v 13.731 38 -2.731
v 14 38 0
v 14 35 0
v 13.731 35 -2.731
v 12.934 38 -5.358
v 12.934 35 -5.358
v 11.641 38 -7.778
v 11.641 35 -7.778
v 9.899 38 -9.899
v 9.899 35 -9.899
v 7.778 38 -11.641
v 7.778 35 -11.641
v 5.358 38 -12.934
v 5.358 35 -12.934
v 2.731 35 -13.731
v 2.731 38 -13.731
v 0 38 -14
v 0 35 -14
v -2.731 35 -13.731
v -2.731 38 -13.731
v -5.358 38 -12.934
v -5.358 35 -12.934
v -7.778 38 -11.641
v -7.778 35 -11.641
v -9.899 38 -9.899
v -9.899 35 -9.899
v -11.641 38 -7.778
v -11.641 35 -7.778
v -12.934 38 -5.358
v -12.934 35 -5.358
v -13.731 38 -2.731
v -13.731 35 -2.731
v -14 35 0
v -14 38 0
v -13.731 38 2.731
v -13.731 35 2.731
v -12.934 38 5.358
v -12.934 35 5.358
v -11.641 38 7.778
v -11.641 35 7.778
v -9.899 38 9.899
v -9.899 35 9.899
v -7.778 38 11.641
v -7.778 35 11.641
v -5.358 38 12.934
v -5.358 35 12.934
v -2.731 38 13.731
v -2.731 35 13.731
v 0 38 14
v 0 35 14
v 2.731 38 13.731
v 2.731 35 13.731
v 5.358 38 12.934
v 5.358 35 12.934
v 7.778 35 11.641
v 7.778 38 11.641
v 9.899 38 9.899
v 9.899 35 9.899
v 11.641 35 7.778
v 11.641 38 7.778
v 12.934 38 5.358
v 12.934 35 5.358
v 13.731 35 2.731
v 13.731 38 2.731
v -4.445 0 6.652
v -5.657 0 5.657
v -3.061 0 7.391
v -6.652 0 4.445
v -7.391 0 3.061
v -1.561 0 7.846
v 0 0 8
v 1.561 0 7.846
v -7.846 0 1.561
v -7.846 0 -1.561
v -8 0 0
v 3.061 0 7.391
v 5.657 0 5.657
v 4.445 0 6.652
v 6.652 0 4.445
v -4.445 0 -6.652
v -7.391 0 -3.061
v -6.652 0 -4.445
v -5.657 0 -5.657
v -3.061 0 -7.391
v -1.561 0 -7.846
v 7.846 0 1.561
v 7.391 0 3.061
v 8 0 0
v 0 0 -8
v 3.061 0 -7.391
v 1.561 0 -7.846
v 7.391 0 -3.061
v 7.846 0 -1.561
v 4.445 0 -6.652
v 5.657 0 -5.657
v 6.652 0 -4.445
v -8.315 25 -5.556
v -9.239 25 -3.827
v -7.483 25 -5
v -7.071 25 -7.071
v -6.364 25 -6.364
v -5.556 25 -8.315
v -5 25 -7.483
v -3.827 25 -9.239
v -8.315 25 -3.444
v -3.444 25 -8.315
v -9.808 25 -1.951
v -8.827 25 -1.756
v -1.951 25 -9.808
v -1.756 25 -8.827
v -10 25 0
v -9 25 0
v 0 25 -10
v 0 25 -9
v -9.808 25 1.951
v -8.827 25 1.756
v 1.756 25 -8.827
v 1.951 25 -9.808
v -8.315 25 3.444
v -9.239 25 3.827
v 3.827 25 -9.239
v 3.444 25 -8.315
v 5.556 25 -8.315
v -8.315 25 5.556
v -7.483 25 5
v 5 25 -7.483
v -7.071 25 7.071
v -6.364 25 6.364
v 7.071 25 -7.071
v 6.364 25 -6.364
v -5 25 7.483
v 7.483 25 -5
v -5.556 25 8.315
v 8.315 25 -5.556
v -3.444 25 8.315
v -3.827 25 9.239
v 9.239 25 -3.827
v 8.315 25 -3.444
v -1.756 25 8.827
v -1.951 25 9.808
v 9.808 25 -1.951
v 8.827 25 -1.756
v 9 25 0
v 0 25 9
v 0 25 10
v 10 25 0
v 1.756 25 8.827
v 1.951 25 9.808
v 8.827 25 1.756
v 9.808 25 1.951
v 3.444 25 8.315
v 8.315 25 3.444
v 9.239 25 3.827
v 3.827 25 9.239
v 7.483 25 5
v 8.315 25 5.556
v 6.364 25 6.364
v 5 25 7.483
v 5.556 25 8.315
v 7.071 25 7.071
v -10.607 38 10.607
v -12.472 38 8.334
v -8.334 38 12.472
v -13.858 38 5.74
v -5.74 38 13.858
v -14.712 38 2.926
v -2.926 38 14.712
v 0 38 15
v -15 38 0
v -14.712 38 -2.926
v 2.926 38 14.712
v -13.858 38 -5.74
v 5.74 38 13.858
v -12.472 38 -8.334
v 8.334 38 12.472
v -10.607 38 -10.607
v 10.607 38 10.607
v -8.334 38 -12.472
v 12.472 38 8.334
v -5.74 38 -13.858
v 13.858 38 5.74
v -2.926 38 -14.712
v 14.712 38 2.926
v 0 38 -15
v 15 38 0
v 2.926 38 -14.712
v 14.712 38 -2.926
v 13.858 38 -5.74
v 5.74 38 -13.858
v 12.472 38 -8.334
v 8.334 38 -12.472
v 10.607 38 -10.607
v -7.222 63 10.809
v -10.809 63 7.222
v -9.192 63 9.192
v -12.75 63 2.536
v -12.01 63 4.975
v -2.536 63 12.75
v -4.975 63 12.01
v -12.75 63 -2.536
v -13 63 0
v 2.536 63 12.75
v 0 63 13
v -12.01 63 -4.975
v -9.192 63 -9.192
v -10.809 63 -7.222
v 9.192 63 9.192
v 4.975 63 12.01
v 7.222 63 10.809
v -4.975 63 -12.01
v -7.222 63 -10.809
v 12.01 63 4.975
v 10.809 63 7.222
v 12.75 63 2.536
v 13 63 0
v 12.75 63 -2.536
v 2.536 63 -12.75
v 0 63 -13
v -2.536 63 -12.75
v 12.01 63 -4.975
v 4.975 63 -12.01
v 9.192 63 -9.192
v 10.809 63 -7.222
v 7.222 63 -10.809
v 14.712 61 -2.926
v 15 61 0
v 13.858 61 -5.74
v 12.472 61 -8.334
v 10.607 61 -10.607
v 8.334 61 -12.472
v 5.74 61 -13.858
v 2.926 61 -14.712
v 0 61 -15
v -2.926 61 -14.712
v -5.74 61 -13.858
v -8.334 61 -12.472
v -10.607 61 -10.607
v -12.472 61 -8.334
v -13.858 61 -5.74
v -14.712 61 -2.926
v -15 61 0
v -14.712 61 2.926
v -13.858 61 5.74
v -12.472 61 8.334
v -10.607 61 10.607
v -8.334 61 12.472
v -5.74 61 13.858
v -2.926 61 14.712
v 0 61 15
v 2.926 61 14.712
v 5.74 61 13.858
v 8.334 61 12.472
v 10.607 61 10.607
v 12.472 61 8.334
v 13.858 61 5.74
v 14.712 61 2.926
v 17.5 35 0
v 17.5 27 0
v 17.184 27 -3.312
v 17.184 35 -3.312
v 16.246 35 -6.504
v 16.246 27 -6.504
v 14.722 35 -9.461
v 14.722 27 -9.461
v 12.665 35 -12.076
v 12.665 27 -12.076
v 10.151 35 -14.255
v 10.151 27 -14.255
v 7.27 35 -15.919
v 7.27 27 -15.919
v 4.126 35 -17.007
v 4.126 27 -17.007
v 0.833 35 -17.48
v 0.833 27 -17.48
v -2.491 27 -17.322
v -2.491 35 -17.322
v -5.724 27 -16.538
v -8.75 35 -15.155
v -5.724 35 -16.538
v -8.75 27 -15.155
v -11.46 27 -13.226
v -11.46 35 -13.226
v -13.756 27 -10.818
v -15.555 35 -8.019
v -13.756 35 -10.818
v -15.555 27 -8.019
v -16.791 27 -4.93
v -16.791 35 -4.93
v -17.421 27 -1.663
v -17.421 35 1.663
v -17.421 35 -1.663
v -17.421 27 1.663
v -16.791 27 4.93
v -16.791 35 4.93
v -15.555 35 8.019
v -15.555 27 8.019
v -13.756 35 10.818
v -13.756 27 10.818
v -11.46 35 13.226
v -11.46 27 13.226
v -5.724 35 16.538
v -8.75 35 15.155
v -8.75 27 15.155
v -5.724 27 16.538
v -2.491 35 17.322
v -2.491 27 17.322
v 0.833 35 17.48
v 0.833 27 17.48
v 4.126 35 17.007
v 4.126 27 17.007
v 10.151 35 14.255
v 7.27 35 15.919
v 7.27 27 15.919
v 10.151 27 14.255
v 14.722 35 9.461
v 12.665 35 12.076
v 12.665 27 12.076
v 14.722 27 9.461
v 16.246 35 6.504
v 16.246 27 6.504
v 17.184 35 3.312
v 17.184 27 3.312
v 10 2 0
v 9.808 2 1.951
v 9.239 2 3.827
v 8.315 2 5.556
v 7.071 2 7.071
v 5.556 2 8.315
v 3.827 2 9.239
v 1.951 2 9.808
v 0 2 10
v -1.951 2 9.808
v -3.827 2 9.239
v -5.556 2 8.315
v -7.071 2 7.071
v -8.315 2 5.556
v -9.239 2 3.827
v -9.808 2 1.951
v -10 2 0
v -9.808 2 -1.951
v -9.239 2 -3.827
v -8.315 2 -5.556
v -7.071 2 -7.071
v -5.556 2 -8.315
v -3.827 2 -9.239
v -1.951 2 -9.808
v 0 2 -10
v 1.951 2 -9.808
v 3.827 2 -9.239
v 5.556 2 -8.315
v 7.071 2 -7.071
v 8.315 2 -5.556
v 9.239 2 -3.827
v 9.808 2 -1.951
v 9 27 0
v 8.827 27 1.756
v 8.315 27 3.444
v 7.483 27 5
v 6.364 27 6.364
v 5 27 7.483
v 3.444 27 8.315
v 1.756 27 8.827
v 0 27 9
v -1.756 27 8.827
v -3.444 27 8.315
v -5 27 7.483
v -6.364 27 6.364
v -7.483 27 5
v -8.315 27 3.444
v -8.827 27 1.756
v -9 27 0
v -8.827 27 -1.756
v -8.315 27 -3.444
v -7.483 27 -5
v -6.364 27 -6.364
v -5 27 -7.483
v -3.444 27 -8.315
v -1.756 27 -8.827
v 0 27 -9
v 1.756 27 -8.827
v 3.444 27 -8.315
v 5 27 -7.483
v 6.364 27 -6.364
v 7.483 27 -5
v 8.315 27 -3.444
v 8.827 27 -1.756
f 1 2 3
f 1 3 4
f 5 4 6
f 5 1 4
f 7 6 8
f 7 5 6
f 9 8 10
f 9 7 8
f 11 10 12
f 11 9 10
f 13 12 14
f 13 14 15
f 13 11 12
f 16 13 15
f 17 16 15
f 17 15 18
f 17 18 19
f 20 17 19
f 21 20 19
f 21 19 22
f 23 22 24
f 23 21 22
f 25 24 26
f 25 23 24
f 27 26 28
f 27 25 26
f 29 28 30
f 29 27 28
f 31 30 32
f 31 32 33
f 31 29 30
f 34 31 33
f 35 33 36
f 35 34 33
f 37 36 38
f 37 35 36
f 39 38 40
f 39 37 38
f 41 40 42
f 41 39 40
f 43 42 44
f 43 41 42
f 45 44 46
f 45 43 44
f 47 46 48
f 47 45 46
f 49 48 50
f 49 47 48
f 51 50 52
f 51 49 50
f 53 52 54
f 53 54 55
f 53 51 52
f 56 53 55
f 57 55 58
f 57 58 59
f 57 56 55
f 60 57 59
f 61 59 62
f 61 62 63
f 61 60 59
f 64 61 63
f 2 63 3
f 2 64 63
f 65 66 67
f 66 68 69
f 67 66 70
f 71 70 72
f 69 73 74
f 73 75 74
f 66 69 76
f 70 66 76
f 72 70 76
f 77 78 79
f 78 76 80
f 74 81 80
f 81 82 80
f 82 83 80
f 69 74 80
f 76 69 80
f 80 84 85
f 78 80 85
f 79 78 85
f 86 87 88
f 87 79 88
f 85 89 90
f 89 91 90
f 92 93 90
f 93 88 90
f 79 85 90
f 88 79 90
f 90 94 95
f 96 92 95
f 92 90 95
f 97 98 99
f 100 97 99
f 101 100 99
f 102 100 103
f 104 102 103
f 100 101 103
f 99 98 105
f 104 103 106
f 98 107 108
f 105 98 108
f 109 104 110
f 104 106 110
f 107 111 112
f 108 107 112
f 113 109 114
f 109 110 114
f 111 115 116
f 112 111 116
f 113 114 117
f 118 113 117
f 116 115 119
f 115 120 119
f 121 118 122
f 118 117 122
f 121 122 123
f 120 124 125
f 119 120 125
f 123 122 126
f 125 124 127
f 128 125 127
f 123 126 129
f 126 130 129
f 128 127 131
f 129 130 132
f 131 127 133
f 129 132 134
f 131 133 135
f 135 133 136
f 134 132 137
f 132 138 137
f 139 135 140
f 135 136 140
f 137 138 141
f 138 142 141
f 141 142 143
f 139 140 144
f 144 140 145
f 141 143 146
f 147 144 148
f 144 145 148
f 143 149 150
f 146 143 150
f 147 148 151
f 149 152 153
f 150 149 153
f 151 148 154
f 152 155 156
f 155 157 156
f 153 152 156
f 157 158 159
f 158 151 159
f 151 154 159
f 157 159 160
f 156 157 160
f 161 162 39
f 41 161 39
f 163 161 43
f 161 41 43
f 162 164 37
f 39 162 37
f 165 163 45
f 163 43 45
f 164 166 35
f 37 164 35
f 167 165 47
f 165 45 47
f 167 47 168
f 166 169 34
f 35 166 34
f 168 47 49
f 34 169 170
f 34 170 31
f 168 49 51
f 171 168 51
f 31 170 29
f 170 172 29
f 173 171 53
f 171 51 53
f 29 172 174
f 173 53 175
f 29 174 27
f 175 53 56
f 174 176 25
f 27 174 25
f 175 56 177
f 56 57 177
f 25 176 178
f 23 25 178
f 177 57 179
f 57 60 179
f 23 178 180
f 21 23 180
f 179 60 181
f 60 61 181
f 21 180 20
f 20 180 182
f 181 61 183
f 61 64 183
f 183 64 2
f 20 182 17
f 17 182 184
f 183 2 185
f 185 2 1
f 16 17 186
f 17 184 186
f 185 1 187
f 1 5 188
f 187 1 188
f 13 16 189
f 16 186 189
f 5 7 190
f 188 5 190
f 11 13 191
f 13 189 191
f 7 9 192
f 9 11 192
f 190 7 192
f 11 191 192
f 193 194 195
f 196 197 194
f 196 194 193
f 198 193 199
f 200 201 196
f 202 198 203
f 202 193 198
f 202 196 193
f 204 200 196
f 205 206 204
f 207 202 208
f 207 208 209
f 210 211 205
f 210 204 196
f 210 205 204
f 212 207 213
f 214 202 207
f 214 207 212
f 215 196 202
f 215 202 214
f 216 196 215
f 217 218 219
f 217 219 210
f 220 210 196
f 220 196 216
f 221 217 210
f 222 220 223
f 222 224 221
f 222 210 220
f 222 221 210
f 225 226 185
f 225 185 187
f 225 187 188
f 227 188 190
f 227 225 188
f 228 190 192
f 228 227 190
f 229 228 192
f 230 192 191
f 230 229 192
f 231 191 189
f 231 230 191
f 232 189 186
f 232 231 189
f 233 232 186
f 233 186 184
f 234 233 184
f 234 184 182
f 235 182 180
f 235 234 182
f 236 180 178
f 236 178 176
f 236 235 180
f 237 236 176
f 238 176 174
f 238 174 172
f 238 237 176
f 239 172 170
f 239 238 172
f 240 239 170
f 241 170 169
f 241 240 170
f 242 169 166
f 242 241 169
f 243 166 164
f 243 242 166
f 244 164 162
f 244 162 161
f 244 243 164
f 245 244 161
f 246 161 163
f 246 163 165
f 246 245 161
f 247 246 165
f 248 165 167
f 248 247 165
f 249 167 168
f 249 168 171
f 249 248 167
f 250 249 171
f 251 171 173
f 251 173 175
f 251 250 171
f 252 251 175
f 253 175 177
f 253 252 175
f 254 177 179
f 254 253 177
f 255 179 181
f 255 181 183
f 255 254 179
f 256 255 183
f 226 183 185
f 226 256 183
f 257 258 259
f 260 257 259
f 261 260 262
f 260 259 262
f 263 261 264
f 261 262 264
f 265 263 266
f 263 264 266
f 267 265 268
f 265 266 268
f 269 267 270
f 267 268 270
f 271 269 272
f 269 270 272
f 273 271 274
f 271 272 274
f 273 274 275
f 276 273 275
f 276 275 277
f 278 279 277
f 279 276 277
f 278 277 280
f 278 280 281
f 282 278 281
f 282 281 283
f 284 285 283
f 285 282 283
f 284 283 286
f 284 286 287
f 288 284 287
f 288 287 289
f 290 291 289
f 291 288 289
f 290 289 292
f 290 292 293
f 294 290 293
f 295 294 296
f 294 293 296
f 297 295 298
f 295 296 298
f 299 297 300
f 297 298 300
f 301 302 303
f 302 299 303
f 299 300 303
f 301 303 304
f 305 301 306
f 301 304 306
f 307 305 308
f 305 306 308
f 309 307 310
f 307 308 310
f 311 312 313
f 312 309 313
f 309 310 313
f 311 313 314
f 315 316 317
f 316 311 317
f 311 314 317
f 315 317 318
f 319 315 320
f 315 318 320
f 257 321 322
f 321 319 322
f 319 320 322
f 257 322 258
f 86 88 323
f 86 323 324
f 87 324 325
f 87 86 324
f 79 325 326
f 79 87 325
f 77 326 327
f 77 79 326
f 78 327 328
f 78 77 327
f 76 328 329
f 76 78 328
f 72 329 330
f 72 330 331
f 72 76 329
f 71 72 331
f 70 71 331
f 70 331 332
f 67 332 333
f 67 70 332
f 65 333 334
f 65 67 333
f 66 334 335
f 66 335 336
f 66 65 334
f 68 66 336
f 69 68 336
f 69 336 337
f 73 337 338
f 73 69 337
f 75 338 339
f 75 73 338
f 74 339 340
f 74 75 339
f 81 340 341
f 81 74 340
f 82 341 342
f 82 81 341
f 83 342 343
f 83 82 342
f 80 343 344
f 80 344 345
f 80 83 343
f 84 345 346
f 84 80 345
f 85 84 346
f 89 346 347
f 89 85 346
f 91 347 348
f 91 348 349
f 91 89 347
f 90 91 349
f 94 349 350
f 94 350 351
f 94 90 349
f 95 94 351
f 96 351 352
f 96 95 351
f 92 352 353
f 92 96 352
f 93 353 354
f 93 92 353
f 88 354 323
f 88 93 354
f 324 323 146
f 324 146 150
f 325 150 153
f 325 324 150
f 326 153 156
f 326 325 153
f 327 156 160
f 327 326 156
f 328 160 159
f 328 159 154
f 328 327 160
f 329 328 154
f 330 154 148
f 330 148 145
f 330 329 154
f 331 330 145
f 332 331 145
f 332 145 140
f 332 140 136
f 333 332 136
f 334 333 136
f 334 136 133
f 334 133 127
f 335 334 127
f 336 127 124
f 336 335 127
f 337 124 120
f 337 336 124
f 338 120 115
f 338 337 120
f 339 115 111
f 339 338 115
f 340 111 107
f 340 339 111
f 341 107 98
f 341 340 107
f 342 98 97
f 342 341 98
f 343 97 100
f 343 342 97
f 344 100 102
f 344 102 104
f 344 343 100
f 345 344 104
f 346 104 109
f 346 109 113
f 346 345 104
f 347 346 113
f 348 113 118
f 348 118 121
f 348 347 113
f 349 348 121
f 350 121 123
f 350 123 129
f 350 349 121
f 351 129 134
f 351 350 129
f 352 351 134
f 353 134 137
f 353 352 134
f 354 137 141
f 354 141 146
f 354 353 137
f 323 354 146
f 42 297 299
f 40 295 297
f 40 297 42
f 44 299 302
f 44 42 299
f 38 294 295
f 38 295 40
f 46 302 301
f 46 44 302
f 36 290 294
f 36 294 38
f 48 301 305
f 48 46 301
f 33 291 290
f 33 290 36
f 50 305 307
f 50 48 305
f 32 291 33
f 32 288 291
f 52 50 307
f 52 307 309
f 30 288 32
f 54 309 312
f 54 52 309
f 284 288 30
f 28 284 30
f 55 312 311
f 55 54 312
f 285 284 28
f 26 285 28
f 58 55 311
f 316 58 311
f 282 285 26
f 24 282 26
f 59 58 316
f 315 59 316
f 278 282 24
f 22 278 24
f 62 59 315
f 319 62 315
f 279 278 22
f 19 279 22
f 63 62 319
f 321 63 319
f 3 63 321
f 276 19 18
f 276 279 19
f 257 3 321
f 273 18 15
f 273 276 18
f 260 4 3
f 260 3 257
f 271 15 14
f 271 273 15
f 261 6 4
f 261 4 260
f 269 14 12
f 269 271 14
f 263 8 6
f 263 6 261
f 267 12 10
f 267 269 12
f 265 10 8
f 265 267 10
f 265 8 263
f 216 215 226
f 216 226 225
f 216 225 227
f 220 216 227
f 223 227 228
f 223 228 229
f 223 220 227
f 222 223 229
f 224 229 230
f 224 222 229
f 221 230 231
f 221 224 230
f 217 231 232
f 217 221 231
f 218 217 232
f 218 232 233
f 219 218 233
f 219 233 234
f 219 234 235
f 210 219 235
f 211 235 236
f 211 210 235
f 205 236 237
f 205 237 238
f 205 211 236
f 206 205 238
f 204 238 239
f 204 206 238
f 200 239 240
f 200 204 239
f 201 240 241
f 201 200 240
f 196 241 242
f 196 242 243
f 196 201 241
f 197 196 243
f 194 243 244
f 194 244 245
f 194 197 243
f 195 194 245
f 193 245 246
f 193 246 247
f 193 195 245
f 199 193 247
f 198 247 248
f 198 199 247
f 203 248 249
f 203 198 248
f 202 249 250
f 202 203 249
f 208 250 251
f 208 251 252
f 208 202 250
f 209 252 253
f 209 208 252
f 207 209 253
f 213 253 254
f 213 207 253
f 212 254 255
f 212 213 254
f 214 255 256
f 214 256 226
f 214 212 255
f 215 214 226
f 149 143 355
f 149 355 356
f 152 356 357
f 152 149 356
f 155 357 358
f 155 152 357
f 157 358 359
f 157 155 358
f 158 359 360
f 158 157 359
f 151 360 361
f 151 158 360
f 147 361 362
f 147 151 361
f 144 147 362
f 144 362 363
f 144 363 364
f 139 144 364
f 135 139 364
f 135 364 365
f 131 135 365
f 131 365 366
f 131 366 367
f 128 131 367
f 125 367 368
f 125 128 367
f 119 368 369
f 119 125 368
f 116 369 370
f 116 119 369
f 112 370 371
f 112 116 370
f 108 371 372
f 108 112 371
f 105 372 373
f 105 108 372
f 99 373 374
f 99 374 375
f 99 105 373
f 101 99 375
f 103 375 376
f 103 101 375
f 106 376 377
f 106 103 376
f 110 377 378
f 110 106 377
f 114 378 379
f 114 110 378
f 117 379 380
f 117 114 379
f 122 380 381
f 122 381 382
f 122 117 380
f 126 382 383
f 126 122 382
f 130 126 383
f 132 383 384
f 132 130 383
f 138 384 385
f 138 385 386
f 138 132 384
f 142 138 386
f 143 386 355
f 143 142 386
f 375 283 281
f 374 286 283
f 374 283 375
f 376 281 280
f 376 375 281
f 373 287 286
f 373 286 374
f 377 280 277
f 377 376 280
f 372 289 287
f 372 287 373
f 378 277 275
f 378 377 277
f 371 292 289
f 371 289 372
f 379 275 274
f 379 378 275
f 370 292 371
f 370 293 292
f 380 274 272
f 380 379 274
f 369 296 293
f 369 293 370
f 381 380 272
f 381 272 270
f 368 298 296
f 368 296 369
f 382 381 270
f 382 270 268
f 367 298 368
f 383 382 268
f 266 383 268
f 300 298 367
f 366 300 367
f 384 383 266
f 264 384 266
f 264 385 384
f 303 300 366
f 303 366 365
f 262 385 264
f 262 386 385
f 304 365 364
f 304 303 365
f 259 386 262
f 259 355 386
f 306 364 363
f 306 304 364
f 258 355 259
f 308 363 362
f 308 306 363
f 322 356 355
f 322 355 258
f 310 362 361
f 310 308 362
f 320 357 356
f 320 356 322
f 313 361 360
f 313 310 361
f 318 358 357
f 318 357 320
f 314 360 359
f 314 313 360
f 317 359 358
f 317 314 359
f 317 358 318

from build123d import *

# Parameters (mm, degrees)
SKETCH_1_R          = 17.5
EXTRUDE_1_DEPTH     = 63
SKETCH_2_OUTSIDE_W  = 53.024
SKETCH_2_OUTSIDE_H  = 53.024
SKETCH_2_OUTSIDE_R  = 15
CUT_EXTRUDE_1_DEPTH = 25
SKETCH_3_OUTSIDE_W  = 53.024
SKETCH_3_OUTSIDE_H  = 53.024
SKETCH_3_OUTSIDE_R  = 14
CUT_EXTRUDE_2_DEPTH = 3
SKETCH_4_OUTSIDE_W  = 53.024
SKETCH_4_OUTSIDE_H  = 53.024
SKETCH_4_OUTSIDE_R  = 10
CUT_EXTRUDE_3_DEPTH = 25
SKETCH_5_OUTSIDE_W  = 53.024
SKETCH_5_OUTSIDE_H  = 53.024
SKETCH_5_OUTSIDE_R  = 9
CUT_EXTRUDE_4_DEPTH = 2
CHAMFER_1_SIZE      = 2


with BuildPart() as part:
    # 草图1 → 凸台-拉伸1 (new body)
    with BuildSketch(Plane(origin=(0, 0, 0), x_dir=(1, 0, 0), z_dir=(0, 1, 0))):
        Circle(SKETCH_1_R)
    extrude(amount=EXTRUDE_1_DEPTH)

    # 草图2 outside → 切除-拉伸1 (cut)
    with BuildSketch(Plane(origin=(0, 63, 0), x_dir=(1, 0, 0), z_dir=(0, 1, 0))):
        Rectangle(SKETCH_2_OUTSIDE_W, SKETCH_2_OUTSIDE_H)
        Circle(SKETCH_2_OUTSIDE_R, mode=Mode.SUBTRACT)
    extrude(amount=-CUT_EXTRUDE_1_DEPTH, mode=Mode.SUBTRACT)

    # 草图3 outside → 切除-拉伸2 (cut)
    with BuildSketch(Plane(origin=(0, 38, 0), x_dir=(1, 0, 0), z_dir=(0, 1, 0))):
        Rectangle(SKETCH_3_OUTSIDE_W, SKETCH_3_OUTSIDE_H)
        Circle(SKETCH_3_OUTSIDE_R, mode=Mode.SUBTRACT)
    extrude(amount=-CUT_EXTRUDE_2_DEPTH, mode=Mode.SUBTRACT)

    # 草图4 outside → 切除-拉伸3 (cut)
    with BuildSketch(Plane.XZ):
        Rectangle(SKETCH_4_OUTSIDE_W, SKETCH_4_OUTSIDE_H)
        Circle(SKETCH_4_OUTSIDE_R, mode=Mode.SUBTRACT)
    extrude(amount=-CUT_EXTRUDE_3_DEPTH, mode=Mode.SUBTRACT)

    # 草图5 outside → 切除-拉伸4 (cut)
    with BuildSketch(Plane.XZ.offset(-25)):
        Rectangle(SKETCH_5_OUTSIDE_W, SKETCH_5_OUTSIDE_H)
        Circle(SKETCH_5_OUTSIDE_R, mode=Mode.SUBTRACT)
    extrude(amount=-CUT_EXTRUDE_4_DEPTH, mode=Mode.SUBTRACT)

    # 倒角1
    chamfer_1_edges = [part.edges().sort_by_distance(p)[0] for p in [
        (-15, 63, 0),
        (-10, 0, 0),
    ]]
    chamfer(chamfer_1_edges, length=CHAMFER_1_SIZE)


solid = part.part
